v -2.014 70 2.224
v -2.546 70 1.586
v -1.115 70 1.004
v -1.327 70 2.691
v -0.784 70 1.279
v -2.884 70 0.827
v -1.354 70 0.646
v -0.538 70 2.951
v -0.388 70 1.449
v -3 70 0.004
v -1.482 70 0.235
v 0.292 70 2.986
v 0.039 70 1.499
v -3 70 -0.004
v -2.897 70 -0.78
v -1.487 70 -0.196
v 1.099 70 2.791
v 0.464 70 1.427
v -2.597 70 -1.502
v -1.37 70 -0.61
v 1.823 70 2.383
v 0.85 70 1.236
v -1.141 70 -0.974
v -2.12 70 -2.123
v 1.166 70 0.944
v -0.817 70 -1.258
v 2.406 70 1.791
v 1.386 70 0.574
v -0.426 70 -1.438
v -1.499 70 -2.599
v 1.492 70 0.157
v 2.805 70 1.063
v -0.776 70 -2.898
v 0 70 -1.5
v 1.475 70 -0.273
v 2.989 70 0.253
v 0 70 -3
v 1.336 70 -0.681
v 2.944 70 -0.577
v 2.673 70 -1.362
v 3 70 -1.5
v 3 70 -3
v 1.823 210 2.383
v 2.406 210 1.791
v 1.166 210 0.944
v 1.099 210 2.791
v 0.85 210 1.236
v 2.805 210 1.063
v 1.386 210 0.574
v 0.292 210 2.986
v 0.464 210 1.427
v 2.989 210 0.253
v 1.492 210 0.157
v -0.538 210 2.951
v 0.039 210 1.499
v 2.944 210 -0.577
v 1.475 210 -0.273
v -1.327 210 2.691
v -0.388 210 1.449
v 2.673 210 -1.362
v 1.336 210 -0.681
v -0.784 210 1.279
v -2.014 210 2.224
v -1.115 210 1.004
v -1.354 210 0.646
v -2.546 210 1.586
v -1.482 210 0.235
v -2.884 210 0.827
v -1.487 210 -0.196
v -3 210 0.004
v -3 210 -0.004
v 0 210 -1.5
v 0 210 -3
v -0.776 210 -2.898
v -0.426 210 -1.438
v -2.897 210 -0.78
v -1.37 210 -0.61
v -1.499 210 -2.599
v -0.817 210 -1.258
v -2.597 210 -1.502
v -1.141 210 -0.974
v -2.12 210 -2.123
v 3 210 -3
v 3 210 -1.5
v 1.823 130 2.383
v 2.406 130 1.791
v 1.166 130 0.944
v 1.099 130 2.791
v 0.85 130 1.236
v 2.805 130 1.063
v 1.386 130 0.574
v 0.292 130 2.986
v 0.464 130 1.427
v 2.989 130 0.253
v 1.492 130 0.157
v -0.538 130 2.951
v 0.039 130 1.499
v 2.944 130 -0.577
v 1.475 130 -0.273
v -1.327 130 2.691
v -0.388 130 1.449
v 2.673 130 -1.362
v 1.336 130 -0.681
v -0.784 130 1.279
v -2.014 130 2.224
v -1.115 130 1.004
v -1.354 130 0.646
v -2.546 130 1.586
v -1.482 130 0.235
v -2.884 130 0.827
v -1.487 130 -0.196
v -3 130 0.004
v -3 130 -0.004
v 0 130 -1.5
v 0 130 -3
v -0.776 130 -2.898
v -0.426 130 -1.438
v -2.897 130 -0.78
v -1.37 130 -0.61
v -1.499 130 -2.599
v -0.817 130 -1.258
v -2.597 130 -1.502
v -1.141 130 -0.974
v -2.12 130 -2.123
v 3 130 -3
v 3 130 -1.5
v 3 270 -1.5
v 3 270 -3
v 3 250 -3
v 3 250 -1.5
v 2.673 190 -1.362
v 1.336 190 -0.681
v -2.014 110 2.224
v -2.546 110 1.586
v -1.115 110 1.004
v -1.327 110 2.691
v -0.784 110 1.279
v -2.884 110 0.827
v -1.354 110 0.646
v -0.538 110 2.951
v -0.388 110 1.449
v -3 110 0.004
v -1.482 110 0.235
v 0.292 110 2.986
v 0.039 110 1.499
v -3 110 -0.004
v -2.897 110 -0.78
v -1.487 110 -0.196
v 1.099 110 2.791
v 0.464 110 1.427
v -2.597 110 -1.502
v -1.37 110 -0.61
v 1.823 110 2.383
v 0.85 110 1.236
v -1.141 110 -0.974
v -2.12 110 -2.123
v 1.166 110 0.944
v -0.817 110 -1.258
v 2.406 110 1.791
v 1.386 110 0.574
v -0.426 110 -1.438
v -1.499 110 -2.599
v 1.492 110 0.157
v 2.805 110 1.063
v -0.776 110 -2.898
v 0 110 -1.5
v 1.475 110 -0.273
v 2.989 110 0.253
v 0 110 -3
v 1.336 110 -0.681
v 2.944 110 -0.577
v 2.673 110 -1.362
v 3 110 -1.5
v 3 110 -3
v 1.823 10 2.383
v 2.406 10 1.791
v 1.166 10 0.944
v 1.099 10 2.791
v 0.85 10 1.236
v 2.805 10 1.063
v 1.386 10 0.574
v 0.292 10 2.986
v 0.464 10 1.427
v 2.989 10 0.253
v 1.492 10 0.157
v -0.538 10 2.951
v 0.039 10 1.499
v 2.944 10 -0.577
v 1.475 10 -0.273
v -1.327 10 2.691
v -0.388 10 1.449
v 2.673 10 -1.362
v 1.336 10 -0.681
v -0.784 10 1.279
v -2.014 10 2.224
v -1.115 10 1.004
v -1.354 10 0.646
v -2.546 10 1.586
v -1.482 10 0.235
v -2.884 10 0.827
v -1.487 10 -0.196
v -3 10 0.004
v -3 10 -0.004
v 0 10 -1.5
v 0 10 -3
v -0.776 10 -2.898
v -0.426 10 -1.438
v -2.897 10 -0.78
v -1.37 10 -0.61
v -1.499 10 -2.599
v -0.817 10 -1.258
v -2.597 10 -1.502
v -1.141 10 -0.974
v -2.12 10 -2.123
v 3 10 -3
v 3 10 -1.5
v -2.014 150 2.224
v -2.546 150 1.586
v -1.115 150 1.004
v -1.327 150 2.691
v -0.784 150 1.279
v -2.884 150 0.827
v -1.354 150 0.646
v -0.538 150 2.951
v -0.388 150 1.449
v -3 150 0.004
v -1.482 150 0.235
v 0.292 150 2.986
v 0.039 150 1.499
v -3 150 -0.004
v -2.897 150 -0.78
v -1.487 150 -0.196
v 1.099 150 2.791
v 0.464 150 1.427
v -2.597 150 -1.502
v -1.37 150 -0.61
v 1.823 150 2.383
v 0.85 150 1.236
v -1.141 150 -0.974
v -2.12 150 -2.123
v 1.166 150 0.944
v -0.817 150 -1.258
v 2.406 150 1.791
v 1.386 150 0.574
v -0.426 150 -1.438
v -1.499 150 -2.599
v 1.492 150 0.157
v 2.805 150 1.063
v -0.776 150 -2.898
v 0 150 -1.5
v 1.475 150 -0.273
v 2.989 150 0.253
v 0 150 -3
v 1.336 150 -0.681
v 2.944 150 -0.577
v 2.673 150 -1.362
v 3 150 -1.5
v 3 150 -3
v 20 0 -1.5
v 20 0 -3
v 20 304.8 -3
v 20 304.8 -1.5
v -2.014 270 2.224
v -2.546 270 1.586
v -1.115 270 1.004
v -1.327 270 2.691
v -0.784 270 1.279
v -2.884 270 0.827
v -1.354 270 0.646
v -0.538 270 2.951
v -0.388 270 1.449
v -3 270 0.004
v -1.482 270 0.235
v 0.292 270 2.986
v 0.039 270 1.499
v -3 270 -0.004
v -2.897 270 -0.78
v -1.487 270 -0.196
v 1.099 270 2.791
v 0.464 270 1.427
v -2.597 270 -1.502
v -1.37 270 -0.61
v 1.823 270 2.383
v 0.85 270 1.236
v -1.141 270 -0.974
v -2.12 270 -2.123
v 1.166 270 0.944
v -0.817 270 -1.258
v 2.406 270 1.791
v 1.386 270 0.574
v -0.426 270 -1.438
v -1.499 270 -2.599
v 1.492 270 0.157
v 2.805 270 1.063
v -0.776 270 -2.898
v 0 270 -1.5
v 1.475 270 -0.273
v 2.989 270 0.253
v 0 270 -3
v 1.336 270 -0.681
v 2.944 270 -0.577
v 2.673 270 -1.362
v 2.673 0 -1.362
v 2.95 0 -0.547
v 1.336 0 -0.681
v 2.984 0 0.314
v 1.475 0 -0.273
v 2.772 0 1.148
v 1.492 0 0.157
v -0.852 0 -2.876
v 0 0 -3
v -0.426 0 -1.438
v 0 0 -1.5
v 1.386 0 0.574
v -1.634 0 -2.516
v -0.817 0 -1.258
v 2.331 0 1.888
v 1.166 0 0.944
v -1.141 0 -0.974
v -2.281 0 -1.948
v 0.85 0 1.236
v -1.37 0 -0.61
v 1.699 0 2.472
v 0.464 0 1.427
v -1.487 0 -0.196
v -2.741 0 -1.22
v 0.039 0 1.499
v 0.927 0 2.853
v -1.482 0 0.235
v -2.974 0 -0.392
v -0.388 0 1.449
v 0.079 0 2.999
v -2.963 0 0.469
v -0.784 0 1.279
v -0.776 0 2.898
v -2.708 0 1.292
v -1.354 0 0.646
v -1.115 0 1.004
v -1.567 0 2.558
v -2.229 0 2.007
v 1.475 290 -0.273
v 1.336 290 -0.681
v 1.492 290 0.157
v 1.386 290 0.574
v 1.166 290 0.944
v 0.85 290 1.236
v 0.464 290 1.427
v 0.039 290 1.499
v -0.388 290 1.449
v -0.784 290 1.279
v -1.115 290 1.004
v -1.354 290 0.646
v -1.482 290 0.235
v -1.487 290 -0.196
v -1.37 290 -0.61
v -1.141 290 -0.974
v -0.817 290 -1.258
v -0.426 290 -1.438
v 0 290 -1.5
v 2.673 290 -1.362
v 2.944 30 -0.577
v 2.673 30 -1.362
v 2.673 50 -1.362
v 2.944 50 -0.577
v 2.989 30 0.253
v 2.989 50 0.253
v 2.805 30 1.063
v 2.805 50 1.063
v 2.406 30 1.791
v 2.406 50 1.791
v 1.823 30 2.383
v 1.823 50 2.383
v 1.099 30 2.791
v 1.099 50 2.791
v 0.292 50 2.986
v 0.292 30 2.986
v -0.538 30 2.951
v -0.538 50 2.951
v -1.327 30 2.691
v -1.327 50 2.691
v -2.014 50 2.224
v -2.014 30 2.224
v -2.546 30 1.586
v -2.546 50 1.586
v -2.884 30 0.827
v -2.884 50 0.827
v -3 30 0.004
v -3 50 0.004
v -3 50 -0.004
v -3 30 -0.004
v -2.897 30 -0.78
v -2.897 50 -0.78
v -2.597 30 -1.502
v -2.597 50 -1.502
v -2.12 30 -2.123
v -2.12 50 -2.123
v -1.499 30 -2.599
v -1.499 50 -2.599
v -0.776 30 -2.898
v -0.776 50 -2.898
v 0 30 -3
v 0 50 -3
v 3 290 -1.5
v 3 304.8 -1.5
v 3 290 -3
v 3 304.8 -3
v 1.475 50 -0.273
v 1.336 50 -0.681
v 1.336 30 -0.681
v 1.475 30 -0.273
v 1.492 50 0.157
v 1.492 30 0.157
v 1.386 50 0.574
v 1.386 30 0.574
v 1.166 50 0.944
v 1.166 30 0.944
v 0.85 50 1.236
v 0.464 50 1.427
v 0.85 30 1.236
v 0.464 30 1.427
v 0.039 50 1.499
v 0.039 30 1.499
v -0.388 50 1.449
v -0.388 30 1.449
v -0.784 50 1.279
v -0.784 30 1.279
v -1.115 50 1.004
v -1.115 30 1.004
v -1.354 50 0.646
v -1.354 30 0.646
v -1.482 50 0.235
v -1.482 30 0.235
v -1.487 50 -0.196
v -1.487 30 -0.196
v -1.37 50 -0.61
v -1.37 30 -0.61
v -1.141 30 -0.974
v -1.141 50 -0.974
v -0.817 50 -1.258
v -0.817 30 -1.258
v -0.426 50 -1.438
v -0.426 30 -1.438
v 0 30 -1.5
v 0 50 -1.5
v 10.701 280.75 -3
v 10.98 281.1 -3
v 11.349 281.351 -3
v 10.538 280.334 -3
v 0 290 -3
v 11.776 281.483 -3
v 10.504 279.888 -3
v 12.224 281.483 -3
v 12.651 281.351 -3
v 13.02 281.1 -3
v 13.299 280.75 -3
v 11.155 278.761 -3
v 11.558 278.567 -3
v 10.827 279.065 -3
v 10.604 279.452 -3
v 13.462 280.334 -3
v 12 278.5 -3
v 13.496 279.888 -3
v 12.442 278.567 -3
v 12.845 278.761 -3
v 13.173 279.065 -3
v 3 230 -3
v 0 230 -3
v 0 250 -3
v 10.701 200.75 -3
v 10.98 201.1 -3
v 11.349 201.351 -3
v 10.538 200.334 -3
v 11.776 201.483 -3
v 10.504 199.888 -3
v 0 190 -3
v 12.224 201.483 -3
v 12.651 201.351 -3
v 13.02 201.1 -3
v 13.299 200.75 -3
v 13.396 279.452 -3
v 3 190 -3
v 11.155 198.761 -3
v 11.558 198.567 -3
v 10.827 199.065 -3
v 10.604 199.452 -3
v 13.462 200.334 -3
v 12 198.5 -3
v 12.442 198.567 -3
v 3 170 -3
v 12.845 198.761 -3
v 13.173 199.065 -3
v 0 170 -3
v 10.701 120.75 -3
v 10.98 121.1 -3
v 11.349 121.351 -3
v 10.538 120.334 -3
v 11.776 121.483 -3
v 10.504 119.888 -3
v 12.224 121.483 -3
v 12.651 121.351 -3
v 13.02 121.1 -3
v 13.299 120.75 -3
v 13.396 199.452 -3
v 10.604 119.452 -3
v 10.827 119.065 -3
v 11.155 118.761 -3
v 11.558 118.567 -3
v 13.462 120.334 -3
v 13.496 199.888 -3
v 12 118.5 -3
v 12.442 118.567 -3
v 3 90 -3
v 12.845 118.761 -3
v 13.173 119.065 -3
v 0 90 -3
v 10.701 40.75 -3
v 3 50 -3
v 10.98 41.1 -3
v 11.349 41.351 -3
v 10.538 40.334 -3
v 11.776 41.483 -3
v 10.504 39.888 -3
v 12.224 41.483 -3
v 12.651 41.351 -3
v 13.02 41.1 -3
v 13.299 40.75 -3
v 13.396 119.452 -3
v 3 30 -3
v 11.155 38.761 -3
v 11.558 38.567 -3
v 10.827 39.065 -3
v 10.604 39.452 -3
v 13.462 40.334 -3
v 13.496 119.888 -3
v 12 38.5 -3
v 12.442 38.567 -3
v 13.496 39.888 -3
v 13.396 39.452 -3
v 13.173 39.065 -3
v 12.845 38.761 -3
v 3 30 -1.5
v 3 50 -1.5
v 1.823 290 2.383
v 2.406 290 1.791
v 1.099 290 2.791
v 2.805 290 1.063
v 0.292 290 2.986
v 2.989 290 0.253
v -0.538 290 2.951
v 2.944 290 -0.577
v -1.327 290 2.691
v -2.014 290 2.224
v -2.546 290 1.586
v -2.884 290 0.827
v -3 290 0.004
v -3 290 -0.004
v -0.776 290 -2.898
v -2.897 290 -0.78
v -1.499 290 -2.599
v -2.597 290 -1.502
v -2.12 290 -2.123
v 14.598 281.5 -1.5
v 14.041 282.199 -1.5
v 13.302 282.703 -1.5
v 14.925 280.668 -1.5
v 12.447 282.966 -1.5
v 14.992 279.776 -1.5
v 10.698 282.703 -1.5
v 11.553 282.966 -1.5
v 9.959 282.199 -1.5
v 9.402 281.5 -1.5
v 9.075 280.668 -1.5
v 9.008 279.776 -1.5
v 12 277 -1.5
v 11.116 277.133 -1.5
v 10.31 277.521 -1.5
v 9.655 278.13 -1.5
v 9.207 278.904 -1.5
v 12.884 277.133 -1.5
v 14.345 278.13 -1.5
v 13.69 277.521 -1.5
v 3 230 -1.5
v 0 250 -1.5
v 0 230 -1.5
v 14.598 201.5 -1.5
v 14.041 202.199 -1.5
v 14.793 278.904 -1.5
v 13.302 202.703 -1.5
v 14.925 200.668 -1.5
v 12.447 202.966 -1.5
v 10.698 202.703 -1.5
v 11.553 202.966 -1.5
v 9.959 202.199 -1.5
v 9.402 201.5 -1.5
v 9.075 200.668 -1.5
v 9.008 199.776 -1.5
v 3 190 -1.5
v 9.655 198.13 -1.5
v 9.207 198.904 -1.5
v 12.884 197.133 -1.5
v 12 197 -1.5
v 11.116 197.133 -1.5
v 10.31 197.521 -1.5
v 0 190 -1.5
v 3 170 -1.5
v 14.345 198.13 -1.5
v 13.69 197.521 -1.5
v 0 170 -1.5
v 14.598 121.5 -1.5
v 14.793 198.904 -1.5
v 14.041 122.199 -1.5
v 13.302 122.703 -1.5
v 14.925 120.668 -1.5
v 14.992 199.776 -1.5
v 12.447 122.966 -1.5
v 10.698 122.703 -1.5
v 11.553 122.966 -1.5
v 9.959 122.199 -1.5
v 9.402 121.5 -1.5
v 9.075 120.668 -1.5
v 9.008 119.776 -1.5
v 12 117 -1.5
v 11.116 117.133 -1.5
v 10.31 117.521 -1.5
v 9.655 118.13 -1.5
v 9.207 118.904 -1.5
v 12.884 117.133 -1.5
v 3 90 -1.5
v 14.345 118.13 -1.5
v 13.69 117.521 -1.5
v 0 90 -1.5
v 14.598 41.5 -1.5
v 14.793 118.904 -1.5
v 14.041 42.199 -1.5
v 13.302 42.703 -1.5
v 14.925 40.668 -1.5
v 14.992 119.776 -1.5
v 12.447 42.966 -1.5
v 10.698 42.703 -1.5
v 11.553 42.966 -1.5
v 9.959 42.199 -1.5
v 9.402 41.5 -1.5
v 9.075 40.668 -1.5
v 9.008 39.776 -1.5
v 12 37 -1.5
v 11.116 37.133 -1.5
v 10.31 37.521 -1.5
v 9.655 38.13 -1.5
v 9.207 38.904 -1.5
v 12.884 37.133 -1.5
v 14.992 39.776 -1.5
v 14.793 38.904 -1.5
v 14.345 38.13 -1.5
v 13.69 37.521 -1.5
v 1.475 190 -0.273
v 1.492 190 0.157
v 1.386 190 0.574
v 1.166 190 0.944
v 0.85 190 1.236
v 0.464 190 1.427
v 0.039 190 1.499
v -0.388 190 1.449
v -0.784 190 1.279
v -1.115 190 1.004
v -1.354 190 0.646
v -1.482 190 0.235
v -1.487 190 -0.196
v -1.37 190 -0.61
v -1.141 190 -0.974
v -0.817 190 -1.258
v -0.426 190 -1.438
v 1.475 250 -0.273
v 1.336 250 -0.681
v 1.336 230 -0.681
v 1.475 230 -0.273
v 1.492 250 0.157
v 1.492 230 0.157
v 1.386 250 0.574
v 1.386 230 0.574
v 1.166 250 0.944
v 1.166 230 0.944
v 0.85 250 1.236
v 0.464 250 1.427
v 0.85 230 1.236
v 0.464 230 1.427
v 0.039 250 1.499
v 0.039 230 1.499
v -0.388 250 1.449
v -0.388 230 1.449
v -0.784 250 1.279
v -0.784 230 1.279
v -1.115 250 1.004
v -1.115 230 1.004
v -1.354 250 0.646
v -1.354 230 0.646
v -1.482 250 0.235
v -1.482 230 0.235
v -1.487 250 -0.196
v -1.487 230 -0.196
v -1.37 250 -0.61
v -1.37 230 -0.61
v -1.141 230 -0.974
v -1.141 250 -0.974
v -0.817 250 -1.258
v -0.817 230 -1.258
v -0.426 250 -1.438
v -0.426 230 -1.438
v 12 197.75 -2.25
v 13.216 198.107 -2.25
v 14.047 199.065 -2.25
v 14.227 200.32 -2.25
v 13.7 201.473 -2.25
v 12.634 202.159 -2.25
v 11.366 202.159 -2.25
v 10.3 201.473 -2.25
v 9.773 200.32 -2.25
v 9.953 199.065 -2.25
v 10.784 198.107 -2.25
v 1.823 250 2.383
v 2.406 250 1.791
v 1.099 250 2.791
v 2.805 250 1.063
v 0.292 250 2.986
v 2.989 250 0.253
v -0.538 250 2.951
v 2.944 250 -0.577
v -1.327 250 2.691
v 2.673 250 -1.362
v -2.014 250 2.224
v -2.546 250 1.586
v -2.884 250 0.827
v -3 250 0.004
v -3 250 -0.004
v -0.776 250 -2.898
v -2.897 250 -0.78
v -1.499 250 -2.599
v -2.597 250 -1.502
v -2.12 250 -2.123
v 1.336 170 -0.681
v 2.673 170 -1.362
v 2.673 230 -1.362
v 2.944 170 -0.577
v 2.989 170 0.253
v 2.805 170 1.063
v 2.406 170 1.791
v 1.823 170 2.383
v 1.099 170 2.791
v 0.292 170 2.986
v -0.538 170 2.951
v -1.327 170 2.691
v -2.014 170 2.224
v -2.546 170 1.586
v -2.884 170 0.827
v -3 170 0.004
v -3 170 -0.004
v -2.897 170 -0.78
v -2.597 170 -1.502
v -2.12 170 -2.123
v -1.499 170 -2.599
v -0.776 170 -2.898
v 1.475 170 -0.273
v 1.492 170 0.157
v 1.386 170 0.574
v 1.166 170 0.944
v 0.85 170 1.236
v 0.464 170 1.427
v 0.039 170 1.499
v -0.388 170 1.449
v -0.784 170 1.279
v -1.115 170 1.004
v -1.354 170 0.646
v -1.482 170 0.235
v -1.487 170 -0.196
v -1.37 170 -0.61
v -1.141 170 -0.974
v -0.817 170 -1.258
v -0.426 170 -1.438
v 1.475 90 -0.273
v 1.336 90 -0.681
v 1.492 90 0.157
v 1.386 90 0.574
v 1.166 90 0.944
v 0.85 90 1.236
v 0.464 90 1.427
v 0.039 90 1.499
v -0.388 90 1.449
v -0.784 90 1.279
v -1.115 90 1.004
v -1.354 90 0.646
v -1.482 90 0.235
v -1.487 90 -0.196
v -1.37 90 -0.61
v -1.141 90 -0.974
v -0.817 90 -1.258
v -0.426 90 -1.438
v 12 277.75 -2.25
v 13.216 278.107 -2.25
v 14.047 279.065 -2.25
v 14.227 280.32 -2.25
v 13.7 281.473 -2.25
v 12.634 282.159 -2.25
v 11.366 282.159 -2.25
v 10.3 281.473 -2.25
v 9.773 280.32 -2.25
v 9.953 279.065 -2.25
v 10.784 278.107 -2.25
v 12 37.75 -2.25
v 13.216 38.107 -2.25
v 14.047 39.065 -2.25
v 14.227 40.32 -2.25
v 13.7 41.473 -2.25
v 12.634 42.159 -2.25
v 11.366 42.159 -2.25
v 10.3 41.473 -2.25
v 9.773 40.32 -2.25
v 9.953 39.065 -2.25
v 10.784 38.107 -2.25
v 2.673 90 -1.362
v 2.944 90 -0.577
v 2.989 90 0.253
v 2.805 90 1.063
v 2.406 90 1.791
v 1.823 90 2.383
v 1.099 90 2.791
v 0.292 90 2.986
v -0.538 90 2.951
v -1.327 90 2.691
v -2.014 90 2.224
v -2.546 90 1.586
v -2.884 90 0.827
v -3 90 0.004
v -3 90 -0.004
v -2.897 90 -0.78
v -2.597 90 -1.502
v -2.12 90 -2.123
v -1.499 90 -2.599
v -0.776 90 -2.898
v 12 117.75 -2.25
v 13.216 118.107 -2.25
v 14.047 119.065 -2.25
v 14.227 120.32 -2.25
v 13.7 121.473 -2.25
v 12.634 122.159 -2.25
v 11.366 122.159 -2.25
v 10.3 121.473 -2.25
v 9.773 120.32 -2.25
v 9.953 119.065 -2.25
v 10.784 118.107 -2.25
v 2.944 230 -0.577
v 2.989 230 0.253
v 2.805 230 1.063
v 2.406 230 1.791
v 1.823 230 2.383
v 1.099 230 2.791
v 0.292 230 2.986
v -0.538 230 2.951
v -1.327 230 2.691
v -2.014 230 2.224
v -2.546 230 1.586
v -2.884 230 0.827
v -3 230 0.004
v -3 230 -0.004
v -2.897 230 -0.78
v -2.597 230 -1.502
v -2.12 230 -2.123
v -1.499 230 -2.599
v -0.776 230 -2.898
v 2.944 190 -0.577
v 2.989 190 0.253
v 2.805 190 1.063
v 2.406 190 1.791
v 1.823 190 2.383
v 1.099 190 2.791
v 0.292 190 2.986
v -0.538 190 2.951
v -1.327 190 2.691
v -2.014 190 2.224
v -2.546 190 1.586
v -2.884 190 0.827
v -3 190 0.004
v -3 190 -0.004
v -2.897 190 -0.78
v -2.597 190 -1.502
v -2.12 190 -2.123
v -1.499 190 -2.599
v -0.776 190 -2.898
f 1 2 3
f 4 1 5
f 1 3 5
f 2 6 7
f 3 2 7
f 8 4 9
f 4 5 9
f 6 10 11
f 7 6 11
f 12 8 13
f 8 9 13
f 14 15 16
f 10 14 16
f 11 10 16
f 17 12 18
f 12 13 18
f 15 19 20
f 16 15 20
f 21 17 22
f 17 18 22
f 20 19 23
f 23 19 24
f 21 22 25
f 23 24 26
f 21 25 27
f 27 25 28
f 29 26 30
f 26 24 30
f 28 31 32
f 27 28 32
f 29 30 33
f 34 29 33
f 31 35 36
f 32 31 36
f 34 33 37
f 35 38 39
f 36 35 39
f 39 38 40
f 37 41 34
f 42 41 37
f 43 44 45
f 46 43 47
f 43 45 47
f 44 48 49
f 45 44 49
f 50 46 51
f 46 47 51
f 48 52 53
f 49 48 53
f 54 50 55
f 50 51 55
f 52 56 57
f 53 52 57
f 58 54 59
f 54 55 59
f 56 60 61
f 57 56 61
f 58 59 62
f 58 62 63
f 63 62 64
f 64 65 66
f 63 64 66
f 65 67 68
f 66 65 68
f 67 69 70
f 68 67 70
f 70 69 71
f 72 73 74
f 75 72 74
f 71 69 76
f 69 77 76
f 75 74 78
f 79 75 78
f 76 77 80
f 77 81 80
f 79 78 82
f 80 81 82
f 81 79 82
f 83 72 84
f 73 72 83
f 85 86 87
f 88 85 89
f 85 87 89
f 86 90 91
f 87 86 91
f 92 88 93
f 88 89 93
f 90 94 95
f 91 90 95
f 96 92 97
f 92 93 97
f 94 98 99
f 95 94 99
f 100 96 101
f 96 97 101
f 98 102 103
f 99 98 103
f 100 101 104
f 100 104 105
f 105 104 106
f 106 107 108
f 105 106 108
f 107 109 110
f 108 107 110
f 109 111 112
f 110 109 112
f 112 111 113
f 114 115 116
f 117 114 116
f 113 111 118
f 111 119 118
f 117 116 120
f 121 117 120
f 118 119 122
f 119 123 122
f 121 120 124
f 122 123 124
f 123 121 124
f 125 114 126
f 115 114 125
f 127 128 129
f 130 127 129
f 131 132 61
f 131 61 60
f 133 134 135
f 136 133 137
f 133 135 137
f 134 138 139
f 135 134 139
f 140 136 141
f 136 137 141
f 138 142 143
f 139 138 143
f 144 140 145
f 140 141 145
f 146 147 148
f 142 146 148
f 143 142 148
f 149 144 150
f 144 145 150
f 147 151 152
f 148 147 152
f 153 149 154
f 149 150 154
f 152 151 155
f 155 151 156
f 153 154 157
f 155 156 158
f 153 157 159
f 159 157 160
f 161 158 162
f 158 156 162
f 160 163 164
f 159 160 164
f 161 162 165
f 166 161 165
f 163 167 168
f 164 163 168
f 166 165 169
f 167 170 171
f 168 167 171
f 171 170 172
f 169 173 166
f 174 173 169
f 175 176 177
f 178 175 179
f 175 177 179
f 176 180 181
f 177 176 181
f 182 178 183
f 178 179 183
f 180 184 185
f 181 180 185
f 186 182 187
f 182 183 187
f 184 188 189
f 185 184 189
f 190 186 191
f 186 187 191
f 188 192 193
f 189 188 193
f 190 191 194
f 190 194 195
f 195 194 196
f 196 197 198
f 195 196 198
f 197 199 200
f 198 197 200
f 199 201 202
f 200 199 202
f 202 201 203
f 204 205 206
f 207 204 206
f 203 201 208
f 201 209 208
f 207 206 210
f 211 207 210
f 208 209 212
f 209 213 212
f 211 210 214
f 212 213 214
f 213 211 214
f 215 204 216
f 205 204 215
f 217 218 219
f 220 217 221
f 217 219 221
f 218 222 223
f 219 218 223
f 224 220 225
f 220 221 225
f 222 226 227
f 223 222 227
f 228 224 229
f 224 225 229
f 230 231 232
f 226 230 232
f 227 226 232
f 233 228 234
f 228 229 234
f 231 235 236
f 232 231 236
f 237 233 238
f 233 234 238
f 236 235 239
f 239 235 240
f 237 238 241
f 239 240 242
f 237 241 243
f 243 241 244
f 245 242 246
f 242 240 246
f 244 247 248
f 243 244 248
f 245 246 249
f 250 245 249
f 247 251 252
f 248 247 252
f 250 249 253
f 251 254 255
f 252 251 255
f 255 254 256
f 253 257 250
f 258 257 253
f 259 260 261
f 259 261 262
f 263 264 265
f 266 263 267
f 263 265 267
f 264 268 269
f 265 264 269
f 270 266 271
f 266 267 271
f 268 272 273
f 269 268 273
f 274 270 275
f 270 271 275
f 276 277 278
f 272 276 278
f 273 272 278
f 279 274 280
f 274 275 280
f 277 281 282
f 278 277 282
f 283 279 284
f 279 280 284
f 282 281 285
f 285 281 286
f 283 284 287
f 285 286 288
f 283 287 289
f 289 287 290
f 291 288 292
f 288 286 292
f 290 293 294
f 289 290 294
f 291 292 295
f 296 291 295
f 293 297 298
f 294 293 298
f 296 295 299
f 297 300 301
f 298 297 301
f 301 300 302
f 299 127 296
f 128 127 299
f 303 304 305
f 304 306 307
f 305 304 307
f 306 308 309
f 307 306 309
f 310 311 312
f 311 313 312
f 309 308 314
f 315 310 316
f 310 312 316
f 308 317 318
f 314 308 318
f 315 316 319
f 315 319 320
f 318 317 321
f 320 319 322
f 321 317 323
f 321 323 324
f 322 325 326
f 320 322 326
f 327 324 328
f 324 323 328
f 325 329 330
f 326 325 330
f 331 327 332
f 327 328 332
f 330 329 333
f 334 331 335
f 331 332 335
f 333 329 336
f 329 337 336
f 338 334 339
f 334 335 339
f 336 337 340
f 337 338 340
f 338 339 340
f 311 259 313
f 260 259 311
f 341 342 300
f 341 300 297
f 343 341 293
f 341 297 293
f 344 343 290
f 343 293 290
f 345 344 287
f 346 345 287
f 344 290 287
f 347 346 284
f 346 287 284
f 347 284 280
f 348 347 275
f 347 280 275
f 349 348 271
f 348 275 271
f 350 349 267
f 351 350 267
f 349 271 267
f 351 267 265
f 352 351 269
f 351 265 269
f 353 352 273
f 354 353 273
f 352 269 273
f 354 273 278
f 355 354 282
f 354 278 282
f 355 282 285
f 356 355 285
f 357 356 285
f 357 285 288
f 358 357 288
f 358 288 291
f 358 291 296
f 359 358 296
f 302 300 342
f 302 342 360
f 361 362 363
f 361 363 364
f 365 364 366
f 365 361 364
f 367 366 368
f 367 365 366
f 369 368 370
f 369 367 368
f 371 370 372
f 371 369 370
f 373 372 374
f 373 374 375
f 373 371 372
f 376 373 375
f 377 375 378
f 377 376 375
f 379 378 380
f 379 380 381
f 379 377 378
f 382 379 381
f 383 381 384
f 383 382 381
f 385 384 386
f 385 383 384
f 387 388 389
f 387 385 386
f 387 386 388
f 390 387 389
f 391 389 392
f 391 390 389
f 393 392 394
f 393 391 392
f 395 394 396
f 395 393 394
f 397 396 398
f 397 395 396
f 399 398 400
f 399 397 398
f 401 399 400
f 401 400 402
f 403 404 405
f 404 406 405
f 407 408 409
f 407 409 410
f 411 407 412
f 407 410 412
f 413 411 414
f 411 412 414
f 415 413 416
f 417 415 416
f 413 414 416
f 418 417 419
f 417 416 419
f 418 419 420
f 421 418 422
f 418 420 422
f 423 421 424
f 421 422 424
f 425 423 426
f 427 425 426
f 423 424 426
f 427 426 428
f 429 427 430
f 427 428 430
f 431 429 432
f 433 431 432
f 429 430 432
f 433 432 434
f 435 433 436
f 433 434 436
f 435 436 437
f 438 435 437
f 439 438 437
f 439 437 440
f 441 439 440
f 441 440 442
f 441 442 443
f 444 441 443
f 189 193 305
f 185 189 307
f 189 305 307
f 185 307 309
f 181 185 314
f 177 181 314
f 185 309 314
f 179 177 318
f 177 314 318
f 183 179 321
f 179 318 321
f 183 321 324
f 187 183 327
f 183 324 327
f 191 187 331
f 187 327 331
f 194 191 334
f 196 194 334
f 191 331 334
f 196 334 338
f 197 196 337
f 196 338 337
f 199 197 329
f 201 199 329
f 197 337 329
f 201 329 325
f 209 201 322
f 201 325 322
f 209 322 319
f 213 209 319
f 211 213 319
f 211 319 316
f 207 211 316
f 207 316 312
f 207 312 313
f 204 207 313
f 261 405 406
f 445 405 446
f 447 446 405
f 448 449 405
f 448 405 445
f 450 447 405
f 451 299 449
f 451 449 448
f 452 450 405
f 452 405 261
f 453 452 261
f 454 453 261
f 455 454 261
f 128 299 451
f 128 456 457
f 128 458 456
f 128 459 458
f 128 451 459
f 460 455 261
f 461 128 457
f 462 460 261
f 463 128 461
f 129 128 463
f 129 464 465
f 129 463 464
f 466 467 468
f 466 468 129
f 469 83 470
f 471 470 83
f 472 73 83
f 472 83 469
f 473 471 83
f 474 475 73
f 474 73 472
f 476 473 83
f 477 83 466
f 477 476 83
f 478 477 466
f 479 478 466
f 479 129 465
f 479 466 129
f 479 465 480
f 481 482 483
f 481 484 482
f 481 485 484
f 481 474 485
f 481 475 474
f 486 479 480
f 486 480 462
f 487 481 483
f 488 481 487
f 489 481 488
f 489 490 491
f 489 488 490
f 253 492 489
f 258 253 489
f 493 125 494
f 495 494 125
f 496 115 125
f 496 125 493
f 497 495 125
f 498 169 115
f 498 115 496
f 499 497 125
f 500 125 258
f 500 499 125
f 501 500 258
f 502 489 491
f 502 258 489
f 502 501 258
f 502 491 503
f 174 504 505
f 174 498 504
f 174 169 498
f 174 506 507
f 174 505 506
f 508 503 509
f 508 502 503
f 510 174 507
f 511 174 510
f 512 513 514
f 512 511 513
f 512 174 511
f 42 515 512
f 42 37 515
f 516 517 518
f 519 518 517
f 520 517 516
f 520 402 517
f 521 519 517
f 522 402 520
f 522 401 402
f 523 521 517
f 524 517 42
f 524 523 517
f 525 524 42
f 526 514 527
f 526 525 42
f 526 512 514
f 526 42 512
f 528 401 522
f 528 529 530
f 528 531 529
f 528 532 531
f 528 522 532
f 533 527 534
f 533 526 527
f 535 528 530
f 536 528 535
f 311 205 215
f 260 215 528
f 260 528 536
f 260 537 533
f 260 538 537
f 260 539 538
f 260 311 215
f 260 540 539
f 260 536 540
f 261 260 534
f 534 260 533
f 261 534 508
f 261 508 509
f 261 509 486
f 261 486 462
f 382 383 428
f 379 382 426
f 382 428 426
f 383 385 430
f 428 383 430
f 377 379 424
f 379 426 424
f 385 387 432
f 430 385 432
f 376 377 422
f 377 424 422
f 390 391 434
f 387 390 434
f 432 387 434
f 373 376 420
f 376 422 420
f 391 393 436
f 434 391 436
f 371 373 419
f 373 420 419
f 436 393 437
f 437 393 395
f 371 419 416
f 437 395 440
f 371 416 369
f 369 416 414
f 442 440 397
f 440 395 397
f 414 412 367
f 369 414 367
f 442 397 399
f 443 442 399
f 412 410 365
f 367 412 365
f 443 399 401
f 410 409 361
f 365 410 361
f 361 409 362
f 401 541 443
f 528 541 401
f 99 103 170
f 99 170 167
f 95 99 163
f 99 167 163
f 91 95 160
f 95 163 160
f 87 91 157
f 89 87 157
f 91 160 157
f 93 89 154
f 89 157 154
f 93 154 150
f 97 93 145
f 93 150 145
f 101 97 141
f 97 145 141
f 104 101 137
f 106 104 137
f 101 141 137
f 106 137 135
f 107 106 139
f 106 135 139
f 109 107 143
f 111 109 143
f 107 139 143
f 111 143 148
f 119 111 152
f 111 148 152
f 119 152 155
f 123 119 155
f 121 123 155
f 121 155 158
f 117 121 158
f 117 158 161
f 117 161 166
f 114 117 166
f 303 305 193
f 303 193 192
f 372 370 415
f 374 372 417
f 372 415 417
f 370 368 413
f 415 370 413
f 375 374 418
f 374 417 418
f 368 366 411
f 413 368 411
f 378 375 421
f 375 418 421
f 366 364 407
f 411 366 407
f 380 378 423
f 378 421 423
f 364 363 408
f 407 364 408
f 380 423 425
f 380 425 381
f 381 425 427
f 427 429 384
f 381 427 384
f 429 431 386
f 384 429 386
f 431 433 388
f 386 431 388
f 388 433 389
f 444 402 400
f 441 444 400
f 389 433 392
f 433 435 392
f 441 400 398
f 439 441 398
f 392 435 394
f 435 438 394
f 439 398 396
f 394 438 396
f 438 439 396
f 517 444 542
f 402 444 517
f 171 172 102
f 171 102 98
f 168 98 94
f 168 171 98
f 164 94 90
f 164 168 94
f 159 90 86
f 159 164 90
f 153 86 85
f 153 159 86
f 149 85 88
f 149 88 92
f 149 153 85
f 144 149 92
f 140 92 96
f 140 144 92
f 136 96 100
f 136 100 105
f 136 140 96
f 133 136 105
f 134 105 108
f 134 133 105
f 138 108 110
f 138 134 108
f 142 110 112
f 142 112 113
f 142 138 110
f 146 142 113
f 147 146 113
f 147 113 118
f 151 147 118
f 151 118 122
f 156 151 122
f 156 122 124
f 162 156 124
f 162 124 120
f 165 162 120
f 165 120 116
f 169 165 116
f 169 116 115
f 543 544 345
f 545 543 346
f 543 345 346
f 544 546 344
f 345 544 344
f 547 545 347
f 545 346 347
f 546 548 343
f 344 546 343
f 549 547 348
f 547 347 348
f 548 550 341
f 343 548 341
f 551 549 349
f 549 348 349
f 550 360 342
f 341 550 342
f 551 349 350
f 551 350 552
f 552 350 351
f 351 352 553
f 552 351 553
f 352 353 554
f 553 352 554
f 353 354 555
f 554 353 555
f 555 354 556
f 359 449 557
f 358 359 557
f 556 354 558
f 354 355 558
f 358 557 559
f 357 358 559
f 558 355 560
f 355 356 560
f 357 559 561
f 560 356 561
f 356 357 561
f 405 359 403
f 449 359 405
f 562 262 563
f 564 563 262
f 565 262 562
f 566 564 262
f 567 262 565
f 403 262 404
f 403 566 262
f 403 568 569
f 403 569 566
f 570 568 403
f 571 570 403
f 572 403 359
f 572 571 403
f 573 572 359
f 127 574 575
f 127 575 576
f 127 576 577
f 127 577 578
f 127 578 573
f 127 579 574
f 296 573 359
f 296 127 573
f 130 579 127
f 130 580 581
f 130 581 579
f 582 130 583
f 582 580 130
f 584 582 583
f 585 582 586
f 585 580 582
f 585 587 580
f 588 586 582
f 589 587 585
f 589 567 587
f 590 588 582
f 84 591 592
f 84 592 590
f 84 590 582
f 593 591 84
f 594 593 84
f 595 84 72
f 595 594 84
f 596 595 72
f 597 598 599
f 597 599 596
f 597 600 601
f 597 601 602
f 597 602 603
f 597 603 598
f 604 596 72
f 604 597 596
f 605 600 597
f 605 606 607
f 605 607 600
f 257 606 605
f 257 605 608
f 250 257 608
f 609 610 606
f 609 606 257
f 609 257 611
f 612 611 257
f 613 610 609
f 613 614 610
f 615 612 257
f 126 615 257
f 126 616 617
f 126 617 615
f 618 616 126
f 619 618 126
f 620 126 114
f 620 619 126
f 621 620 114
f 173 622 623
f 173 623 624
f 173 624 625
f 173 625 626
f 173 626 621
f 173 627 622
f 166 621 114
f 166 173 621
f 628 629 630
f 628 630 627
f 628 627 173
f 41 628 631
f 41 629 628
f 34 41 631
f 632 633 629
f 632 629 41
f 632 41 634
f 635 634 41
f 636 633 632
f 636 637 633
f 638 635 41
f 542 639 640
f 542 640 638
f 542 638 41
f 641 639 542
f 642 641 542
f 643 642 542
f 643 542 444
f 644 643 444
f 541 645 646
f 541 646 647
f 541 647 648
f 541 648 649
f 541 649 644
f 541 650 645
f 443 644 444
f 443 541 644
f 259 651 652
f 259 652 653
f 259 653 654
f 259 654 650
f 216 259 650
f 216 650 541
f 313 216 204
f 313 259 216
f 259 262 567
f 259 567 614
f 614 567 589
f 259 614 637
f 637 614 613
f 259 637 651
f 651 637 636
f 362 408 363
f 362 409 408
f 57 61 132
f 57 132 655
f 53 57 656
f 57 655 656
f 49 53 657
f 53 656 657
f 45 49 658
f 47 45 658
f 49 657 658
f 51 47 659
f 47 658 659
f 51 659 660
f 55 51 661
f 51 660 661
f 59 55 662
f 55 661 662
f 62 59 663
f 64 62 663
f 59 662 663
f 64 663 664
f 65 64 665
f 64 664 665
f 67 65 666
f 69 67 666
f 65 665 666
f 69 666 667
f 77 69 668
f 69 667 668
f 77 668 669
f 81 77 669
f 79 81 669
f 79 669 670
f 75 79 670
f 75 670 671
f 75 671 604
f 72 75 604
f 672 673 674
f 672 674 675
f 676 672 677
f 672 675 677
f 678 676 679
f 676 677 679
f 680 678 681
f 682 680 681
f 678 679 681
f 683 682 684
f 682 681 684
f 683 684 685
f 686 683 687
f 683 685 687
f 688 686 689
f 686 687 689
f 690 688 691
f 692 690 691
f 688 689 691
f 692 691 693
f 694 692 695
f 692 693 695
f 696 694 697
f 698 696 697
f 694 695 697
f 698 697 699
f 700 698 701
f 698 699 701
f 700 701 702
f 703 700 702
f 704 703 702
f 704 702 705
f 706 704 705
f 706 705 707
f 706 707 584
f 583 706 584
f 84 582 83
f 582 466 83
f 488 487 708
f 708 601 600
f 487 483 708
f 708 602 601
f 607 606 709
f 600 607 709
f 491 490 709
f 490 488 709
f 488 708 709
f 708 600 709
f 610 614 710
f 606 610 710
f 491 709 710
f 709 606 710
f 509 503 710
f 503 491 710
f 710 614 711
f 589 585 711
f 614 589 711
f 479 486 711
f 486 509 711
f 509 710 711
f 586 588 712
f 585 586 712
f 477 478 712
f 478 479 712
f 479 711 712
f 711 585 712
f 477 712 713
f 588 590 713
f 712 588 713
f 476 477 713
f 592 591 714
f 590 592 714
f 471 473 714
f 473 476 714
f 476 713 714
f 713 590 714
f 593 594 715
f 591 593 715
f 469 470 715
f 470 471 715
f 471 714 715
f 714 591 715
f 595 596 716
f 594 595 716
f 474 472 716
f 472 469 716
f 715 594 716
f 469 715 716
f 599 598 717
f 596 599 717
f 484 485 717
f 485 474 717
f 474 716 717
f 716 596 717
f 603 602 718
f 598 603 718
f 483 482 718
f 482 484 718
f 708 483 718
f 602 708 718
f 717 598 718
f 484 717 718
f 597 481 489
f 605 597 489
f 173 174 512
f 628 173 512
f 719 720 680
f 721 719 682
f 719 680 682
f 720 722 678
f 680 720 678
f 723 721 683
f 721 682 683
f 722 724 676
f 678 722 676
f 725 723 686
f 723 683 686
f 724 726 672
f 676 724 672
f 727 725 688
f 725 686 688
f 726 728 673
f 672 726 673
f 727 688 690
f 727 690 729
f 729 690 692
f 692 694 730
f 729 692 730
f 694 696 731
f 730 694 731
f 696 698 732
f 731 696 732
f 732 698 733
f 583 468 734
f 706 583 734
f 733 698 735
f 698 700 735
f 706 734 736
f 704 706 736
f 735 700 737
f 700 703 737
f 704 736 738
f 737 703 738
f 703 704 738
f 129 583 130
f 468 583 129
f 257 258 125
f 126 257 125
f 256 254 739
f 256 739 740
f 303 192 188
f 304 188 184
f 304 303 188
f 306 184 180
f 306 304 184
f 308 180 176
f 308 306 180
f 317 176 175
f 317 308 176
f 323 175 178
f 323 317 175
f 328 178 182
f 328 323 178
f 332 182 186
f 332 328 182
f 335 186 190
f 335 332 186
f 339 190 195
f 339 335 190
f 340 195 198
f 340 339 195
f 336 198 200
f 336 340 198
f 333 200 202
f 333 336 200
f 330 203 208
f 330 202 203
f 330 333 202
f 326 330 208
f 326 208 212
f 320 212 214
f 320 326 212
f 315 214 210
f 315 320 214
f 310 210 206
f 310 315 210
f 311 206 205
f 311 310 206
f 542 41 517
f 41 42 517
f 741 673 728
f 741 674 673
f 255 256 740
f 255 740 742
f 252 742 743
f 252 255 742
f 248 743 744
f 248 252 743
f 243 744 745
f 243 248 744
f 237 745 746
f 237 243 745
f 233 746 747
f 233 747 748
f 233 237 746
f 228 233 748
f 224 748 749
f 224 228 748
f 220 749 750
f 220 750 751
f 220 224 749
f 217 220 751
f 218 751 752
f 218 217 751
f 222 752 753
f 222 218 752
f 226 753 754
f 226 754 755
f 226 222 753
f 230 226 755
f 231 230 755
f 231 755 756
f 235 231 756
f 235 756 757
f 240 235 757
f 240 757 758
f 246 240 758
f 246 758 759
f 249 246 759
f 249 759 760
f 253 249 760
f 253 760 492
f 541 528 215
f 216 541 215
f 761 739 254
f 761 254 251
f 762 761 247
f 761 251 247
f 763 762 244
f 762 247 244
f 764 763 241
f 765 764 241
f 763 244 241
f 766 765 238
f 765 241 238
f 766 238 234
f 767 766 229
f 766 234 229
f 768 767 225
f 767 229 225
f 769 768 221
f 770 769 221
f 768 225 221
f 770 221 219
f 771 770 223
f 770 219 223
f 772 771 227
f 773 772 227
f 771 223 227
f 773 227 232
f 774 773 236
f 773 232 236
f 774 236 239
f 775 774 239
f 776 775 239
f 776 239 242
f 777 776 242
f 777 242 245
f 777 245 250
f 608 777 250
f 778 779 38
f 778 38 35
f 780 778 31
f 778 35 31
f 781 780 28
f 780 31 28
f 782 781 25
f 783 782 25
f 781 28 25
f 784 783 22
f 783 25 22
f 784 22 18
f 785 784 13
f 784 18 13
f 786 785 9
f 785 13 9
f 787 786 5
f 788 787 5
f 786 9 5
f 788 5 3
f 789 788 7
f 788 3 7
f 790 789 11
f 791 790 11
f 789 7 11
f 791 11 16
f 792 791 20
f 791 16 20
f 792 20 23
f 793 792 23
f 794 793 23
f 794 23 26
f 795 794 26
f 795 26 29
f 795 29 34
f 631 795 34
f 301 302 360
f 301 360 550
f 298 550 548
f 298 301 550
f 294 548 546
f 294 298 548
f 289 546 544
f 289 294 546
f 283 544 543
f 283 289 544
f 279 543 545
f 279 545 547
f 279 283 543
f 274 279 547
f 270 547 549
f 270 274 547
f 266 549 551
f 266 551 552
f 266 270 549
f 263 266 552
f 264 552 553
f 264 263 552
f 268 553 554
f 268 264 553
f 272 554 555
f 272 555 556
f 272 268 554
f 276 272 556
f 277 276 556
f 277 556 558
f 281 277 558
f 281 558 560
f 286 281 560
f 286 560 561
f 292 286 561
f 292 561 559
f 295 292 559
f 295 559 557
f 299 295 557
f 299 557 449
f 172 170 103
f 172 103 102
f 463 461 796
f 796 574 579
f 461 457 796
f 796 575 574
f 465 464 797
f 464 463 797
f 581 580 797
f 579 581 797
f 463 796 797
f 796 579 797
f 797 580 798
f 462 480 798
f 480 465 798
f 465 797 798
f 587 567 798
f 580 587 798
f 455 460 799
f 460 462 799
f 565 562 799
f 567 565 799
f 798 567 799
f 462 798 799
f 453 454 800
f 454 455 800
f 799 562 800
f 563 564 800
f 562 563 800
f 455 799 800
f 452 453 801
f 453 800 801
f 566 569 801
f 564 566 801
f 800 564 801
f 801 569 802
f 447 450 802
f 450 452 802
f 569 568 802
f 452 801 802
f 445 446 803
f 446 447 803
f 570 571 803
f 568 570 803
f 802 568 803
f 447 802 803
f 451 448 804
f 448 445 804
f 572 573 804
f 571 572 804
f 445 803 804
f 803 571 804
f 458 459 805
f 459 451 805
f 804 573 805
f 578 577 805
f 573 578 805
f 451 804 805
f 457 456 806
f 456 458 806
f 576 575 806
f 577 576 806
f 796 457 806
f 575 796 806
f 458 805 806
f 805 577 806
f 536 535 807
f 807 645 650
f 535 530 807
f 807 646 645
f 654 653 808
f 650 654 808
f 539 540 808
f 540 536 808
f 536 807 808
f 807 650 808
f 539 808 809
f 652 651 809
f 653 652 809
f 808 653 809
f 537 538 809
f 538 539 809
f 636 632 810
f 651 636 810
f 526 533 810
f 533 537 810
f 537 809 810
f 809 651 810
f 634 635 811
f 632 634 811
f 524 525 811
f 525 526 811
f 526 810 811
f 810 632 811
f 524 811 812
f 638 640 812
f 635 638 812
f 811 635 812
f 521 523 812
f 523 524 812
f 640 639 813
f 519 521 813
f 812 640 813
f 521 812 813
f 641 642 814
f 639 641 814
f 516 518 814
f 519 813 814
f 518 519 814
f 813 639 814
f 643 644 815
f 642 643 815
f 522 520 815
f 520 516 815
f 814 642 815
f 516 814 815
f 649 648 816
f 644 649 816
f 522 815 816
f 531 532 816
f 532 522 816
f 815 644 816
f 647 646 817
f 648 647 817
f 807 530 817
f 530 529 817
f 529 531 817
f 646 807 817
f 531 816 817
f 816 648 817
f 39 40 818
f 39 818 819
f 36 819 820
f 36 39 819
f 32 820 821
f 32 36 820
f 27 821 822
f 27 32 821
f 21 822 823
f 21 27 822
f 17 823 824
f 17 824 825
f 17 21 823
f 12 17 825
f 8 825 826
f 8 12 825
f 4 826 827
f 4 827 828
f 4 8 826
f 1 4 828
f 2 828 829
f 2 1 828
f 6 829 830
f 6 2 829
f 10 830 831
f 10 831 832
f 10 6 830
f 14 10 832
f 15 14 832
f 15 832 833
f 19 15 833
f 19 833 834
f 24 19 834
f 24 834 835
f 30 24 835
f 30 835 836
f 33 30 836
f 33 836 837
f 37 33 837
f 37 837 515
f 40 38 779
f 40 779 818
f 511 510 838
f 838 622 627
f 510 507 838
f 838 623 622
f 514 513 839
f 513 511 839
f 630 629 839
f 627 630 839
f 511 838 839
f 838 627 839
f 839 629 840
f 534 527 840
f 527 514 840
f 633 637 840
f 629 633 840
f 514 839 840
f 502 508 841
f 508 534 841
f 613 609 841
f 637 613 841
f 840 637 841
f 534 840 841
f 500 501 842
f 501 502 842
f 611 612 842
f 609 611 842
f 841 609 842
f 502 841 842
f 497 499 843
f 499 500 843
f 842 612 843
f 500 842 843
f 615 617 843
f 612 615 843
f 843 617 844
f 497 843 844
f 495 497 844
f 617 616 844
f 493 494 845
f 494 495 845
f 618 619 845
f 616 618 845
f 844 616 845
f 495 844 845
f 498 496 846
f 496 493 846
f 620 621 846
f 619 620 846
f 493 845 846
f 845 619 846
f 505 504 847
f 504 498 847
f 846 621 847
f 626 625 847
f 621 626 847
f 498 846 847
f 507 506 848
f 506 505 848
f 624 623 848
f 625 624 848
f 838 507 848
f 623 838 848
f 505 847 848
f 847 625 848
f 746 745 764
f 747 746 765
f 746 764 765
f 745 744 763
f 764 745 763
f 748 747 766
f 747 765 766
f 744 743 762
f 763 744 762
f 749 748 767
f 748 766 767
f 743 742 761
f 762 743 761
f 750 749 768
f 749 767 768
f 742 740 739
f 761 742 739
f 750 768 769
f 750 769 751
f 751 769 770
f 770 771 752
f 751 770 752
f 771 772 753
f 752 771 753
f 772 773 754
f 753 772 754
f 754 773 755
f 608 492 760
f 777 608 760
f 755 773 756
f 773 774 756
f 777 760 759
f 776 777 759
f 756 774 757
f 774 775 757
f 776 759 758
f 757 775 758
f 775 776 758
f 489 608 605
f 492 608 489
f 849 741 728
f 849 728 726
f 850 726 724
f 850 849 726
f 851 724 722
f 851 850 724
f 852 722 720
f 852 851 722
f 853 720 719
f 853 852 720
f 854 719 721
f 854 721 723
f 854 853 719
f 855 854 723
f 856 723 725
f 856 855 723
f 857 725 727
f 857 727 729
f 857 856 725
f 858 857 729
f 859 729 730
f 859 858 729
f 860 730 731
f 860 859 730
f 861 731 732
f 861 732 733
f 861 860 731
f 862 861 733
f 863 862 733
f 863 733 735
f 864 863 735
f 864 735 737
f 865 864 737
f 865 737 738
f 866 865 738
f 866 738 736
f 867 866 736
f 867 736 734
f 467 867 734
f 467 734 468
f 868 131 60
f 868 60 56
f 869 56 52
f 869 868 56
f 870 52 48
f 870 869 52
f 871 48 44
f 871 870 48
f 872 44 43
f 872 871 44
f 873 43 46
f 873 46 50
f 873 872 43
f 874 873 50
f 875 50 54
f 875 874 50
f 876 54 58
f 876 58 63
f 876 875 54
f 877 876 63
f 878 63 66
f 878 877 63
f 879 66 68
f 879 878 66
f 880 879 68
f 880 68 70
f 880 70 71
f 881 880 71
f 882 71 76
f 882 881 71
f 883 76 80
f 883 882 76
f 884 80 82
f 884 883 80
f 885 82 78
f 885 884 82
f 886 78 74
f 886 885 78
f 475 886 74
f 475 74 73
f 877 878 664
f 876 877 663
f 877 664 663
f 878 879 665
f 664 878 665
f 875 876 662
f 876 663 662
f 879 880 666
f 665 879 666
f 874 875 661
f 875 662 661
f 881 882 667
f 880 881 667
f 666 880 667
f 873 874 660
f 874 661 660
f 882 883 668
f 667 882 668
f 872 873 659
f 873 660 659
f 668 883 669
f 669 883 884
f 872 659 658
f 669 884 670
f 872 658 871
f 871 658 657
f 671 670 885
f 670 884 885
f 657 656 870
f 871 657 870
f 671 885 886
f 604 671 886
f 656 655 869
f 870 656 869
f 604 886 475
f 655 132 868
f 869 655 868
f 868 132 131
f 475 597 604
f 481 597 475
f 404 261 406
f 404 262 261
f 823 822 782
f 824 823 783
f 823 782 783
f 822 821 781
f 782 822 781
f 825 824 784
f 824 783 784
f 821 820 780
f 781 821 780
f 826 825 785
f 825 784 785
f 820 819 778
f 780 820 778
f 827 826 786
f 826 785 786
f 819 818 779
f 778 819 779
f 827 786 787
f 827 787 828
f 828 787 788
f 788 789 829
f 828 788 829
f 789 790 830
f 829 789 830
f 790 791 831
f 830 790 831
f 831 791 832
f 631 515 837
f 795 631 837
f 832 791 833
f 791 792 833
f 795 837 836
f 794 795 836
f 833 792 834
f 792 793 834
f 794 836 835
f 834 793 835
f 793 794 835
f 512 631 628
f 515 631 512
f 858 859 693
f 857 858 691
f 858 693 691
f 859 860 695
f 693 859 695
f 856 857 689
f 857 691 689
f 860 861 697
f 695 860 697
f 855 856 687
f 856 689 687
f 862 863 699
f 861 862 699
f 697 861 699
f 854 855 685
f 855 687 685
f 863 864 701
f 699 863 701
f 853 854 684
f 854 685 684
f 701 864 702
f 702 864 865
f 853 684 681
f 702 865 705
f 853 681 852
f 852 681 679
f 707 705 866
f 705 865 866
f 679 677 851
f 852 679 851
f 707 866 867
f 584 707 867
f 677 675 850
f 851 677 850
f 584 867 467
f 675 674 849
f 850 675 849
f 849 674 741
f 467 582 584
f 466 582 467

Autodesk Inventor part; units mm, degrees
ref_plane "YZ Plane" through (0, 0, 0) normal (1, 0, 0) x (0, 1, 0)
ref_plane "XZ Plane" through (0, 0, 0) normal (0, 1, 0) x (-1, 0, 0)
ref_plane "XY Plane" through (0, 0, 0) normal (0, 0, 1) x (1, 0, 0)
sketch "Sketch2" plane through (0, 0, 0) normal (0, 1, 0) x (-1, 0, 0)
  arc A0 (0, -1.5) -> (-1.3365, -0.681) centre (0, 0) ccw
  arc A1 (0, -3) -> (-2.673, -1.362) centre (0, 0) ccw
  line L0 (0, -3) -> (-20, -3)
  line L1 (-20, -3) -> (-20, -1.5)
  line L2 (-20, -1.5) -> (0, -1.5)
  line L3 (-1.3365, -0.681) -> (-2.673, -1.362)
  dimension "d0" = 1.5
  dimension "d1" = 1.5
  dimension "d2" = 20
  dimension "d3" = 3
  dimension "d4" = 27
extrude "Extrusion1" add sketch "Sketch2" along normal blind 304.8
sketch "Sketch3" plane through (20, 0, -3) normal (0, 0, -1) x (-1, 0, 0)
  line L0 (0, 0) -> (20, 0) projected
  line L1 (23, 30) -> (17, 30)
  line L2 (17, 30) -> (17, 10)
  line L3 (17, 10) -> (23, 10)
  line L4 (23, 10) -> (23, 30)
  line L5 (17, 0) -> (17, 304.8) projected
  dimension "d7" = 10
  dimension "d8" = 20
  dimension "d9" = 6
extrude "Extrusion2" cut sketch "Sketch3" against normal through all
pattern_linear "Rectangular Pattern1" count 25 spacing 40 along (0, 1, 0) of "Extrusion2"
sketch "Sketch4" plane through (20, 0, -1.5) normal (0, 0, 1) x (1, 0, 0)
  line L0 (-20, 70) -> (-20, 90) projected
  line L1 (-20, 70) -> (-20, 90) projected
  line L2 (-20, 70) -> (-20, 90) projected
  line L3 (-20, 70) -> (-20, 90) projected
  line L4 (-20, 70) -> (-20, 90) projected
  line L5 (-20, 70) -> (-20, 90) projected
  line L6 (-20, 70) -> (-20, 90) projected
  line L7 (-20, 70) -> (-20, 90) projected
  line L8 (-20, 270) -> (-20, 290) projected
  line L9 (-20, 190) -> (-20, 210) projected
  line L10 (-20, 110) -> (-20, 130) projected
  line L11 (-20, 30) -> (-20, 50) projected
  line L12 (0, 0) -> (0, 304.8) projected
  point P0 (-20, 930)
  point P1 (-20, 910)
  point P2 (-20, 850)
  point P3 (-20, 830)
  point P4 (-20, 770)
  point P5 (-20, 750)
  point P6 (-20, 690)
  point P7 (-20, 670)
  point P8 (-20, 610)
  point P9 (-20, 590)
  point P10 (-20, 530)
  point P11 (-20, 510)
  point P12 (-20, 450)
  point P13 (-20, 430)
  point P14 (-20, 370)
  point P15 (-20, 350)
  point P16 (-8, 40)
  point P17 (-8, 120)
  point P18 (-8, 200)
  point P19 (-8, 280)
  point P20 (-8, 360)
  point P21 (-8, 440)
  point P22 (-8, 520)
  point P23 (-8, 600)
  point P24 (-8, 680)
  point P25 (-8, 760)
  point P26 (-8, 840)
  point P27 (-8, 920)
  point P28 (-20, 40)
  point P29 (-20, 120)
  point P30 (-20, 200)
  point P31 (-20, 280)
  point P32 (-20, 360)
  point P33 (-20, 440)
  point P34 (-20, 520)
  point P35 (-20, 600)
  point P36 (-20, 680)
  point P37 (-20, 760)
  point P38 (-20, 840)
  point P39 (-20, 920)
  dimension "d15" = 8
hole "Hole1" at (12, 40, -1.5) at (12, 120, -1.5) at (12, 200, -1.5) at (12, 280, -1.5) at (12, 360, -1.5) at (12, 440, -1.5) at (12, 520, -1.5) at (12, 600, -1.5) at (12, 680, -1.5) at (12, 760, -1.5) at (12, 840, -1.5) at (12, 920, -1.5) direction (0, 0, -1) diameter 3 end through all countersink diameter 6 countersink angle 90
equation "\"d1\" = d0"
properties part number "SIDE 1" material "Steel, Mild"
